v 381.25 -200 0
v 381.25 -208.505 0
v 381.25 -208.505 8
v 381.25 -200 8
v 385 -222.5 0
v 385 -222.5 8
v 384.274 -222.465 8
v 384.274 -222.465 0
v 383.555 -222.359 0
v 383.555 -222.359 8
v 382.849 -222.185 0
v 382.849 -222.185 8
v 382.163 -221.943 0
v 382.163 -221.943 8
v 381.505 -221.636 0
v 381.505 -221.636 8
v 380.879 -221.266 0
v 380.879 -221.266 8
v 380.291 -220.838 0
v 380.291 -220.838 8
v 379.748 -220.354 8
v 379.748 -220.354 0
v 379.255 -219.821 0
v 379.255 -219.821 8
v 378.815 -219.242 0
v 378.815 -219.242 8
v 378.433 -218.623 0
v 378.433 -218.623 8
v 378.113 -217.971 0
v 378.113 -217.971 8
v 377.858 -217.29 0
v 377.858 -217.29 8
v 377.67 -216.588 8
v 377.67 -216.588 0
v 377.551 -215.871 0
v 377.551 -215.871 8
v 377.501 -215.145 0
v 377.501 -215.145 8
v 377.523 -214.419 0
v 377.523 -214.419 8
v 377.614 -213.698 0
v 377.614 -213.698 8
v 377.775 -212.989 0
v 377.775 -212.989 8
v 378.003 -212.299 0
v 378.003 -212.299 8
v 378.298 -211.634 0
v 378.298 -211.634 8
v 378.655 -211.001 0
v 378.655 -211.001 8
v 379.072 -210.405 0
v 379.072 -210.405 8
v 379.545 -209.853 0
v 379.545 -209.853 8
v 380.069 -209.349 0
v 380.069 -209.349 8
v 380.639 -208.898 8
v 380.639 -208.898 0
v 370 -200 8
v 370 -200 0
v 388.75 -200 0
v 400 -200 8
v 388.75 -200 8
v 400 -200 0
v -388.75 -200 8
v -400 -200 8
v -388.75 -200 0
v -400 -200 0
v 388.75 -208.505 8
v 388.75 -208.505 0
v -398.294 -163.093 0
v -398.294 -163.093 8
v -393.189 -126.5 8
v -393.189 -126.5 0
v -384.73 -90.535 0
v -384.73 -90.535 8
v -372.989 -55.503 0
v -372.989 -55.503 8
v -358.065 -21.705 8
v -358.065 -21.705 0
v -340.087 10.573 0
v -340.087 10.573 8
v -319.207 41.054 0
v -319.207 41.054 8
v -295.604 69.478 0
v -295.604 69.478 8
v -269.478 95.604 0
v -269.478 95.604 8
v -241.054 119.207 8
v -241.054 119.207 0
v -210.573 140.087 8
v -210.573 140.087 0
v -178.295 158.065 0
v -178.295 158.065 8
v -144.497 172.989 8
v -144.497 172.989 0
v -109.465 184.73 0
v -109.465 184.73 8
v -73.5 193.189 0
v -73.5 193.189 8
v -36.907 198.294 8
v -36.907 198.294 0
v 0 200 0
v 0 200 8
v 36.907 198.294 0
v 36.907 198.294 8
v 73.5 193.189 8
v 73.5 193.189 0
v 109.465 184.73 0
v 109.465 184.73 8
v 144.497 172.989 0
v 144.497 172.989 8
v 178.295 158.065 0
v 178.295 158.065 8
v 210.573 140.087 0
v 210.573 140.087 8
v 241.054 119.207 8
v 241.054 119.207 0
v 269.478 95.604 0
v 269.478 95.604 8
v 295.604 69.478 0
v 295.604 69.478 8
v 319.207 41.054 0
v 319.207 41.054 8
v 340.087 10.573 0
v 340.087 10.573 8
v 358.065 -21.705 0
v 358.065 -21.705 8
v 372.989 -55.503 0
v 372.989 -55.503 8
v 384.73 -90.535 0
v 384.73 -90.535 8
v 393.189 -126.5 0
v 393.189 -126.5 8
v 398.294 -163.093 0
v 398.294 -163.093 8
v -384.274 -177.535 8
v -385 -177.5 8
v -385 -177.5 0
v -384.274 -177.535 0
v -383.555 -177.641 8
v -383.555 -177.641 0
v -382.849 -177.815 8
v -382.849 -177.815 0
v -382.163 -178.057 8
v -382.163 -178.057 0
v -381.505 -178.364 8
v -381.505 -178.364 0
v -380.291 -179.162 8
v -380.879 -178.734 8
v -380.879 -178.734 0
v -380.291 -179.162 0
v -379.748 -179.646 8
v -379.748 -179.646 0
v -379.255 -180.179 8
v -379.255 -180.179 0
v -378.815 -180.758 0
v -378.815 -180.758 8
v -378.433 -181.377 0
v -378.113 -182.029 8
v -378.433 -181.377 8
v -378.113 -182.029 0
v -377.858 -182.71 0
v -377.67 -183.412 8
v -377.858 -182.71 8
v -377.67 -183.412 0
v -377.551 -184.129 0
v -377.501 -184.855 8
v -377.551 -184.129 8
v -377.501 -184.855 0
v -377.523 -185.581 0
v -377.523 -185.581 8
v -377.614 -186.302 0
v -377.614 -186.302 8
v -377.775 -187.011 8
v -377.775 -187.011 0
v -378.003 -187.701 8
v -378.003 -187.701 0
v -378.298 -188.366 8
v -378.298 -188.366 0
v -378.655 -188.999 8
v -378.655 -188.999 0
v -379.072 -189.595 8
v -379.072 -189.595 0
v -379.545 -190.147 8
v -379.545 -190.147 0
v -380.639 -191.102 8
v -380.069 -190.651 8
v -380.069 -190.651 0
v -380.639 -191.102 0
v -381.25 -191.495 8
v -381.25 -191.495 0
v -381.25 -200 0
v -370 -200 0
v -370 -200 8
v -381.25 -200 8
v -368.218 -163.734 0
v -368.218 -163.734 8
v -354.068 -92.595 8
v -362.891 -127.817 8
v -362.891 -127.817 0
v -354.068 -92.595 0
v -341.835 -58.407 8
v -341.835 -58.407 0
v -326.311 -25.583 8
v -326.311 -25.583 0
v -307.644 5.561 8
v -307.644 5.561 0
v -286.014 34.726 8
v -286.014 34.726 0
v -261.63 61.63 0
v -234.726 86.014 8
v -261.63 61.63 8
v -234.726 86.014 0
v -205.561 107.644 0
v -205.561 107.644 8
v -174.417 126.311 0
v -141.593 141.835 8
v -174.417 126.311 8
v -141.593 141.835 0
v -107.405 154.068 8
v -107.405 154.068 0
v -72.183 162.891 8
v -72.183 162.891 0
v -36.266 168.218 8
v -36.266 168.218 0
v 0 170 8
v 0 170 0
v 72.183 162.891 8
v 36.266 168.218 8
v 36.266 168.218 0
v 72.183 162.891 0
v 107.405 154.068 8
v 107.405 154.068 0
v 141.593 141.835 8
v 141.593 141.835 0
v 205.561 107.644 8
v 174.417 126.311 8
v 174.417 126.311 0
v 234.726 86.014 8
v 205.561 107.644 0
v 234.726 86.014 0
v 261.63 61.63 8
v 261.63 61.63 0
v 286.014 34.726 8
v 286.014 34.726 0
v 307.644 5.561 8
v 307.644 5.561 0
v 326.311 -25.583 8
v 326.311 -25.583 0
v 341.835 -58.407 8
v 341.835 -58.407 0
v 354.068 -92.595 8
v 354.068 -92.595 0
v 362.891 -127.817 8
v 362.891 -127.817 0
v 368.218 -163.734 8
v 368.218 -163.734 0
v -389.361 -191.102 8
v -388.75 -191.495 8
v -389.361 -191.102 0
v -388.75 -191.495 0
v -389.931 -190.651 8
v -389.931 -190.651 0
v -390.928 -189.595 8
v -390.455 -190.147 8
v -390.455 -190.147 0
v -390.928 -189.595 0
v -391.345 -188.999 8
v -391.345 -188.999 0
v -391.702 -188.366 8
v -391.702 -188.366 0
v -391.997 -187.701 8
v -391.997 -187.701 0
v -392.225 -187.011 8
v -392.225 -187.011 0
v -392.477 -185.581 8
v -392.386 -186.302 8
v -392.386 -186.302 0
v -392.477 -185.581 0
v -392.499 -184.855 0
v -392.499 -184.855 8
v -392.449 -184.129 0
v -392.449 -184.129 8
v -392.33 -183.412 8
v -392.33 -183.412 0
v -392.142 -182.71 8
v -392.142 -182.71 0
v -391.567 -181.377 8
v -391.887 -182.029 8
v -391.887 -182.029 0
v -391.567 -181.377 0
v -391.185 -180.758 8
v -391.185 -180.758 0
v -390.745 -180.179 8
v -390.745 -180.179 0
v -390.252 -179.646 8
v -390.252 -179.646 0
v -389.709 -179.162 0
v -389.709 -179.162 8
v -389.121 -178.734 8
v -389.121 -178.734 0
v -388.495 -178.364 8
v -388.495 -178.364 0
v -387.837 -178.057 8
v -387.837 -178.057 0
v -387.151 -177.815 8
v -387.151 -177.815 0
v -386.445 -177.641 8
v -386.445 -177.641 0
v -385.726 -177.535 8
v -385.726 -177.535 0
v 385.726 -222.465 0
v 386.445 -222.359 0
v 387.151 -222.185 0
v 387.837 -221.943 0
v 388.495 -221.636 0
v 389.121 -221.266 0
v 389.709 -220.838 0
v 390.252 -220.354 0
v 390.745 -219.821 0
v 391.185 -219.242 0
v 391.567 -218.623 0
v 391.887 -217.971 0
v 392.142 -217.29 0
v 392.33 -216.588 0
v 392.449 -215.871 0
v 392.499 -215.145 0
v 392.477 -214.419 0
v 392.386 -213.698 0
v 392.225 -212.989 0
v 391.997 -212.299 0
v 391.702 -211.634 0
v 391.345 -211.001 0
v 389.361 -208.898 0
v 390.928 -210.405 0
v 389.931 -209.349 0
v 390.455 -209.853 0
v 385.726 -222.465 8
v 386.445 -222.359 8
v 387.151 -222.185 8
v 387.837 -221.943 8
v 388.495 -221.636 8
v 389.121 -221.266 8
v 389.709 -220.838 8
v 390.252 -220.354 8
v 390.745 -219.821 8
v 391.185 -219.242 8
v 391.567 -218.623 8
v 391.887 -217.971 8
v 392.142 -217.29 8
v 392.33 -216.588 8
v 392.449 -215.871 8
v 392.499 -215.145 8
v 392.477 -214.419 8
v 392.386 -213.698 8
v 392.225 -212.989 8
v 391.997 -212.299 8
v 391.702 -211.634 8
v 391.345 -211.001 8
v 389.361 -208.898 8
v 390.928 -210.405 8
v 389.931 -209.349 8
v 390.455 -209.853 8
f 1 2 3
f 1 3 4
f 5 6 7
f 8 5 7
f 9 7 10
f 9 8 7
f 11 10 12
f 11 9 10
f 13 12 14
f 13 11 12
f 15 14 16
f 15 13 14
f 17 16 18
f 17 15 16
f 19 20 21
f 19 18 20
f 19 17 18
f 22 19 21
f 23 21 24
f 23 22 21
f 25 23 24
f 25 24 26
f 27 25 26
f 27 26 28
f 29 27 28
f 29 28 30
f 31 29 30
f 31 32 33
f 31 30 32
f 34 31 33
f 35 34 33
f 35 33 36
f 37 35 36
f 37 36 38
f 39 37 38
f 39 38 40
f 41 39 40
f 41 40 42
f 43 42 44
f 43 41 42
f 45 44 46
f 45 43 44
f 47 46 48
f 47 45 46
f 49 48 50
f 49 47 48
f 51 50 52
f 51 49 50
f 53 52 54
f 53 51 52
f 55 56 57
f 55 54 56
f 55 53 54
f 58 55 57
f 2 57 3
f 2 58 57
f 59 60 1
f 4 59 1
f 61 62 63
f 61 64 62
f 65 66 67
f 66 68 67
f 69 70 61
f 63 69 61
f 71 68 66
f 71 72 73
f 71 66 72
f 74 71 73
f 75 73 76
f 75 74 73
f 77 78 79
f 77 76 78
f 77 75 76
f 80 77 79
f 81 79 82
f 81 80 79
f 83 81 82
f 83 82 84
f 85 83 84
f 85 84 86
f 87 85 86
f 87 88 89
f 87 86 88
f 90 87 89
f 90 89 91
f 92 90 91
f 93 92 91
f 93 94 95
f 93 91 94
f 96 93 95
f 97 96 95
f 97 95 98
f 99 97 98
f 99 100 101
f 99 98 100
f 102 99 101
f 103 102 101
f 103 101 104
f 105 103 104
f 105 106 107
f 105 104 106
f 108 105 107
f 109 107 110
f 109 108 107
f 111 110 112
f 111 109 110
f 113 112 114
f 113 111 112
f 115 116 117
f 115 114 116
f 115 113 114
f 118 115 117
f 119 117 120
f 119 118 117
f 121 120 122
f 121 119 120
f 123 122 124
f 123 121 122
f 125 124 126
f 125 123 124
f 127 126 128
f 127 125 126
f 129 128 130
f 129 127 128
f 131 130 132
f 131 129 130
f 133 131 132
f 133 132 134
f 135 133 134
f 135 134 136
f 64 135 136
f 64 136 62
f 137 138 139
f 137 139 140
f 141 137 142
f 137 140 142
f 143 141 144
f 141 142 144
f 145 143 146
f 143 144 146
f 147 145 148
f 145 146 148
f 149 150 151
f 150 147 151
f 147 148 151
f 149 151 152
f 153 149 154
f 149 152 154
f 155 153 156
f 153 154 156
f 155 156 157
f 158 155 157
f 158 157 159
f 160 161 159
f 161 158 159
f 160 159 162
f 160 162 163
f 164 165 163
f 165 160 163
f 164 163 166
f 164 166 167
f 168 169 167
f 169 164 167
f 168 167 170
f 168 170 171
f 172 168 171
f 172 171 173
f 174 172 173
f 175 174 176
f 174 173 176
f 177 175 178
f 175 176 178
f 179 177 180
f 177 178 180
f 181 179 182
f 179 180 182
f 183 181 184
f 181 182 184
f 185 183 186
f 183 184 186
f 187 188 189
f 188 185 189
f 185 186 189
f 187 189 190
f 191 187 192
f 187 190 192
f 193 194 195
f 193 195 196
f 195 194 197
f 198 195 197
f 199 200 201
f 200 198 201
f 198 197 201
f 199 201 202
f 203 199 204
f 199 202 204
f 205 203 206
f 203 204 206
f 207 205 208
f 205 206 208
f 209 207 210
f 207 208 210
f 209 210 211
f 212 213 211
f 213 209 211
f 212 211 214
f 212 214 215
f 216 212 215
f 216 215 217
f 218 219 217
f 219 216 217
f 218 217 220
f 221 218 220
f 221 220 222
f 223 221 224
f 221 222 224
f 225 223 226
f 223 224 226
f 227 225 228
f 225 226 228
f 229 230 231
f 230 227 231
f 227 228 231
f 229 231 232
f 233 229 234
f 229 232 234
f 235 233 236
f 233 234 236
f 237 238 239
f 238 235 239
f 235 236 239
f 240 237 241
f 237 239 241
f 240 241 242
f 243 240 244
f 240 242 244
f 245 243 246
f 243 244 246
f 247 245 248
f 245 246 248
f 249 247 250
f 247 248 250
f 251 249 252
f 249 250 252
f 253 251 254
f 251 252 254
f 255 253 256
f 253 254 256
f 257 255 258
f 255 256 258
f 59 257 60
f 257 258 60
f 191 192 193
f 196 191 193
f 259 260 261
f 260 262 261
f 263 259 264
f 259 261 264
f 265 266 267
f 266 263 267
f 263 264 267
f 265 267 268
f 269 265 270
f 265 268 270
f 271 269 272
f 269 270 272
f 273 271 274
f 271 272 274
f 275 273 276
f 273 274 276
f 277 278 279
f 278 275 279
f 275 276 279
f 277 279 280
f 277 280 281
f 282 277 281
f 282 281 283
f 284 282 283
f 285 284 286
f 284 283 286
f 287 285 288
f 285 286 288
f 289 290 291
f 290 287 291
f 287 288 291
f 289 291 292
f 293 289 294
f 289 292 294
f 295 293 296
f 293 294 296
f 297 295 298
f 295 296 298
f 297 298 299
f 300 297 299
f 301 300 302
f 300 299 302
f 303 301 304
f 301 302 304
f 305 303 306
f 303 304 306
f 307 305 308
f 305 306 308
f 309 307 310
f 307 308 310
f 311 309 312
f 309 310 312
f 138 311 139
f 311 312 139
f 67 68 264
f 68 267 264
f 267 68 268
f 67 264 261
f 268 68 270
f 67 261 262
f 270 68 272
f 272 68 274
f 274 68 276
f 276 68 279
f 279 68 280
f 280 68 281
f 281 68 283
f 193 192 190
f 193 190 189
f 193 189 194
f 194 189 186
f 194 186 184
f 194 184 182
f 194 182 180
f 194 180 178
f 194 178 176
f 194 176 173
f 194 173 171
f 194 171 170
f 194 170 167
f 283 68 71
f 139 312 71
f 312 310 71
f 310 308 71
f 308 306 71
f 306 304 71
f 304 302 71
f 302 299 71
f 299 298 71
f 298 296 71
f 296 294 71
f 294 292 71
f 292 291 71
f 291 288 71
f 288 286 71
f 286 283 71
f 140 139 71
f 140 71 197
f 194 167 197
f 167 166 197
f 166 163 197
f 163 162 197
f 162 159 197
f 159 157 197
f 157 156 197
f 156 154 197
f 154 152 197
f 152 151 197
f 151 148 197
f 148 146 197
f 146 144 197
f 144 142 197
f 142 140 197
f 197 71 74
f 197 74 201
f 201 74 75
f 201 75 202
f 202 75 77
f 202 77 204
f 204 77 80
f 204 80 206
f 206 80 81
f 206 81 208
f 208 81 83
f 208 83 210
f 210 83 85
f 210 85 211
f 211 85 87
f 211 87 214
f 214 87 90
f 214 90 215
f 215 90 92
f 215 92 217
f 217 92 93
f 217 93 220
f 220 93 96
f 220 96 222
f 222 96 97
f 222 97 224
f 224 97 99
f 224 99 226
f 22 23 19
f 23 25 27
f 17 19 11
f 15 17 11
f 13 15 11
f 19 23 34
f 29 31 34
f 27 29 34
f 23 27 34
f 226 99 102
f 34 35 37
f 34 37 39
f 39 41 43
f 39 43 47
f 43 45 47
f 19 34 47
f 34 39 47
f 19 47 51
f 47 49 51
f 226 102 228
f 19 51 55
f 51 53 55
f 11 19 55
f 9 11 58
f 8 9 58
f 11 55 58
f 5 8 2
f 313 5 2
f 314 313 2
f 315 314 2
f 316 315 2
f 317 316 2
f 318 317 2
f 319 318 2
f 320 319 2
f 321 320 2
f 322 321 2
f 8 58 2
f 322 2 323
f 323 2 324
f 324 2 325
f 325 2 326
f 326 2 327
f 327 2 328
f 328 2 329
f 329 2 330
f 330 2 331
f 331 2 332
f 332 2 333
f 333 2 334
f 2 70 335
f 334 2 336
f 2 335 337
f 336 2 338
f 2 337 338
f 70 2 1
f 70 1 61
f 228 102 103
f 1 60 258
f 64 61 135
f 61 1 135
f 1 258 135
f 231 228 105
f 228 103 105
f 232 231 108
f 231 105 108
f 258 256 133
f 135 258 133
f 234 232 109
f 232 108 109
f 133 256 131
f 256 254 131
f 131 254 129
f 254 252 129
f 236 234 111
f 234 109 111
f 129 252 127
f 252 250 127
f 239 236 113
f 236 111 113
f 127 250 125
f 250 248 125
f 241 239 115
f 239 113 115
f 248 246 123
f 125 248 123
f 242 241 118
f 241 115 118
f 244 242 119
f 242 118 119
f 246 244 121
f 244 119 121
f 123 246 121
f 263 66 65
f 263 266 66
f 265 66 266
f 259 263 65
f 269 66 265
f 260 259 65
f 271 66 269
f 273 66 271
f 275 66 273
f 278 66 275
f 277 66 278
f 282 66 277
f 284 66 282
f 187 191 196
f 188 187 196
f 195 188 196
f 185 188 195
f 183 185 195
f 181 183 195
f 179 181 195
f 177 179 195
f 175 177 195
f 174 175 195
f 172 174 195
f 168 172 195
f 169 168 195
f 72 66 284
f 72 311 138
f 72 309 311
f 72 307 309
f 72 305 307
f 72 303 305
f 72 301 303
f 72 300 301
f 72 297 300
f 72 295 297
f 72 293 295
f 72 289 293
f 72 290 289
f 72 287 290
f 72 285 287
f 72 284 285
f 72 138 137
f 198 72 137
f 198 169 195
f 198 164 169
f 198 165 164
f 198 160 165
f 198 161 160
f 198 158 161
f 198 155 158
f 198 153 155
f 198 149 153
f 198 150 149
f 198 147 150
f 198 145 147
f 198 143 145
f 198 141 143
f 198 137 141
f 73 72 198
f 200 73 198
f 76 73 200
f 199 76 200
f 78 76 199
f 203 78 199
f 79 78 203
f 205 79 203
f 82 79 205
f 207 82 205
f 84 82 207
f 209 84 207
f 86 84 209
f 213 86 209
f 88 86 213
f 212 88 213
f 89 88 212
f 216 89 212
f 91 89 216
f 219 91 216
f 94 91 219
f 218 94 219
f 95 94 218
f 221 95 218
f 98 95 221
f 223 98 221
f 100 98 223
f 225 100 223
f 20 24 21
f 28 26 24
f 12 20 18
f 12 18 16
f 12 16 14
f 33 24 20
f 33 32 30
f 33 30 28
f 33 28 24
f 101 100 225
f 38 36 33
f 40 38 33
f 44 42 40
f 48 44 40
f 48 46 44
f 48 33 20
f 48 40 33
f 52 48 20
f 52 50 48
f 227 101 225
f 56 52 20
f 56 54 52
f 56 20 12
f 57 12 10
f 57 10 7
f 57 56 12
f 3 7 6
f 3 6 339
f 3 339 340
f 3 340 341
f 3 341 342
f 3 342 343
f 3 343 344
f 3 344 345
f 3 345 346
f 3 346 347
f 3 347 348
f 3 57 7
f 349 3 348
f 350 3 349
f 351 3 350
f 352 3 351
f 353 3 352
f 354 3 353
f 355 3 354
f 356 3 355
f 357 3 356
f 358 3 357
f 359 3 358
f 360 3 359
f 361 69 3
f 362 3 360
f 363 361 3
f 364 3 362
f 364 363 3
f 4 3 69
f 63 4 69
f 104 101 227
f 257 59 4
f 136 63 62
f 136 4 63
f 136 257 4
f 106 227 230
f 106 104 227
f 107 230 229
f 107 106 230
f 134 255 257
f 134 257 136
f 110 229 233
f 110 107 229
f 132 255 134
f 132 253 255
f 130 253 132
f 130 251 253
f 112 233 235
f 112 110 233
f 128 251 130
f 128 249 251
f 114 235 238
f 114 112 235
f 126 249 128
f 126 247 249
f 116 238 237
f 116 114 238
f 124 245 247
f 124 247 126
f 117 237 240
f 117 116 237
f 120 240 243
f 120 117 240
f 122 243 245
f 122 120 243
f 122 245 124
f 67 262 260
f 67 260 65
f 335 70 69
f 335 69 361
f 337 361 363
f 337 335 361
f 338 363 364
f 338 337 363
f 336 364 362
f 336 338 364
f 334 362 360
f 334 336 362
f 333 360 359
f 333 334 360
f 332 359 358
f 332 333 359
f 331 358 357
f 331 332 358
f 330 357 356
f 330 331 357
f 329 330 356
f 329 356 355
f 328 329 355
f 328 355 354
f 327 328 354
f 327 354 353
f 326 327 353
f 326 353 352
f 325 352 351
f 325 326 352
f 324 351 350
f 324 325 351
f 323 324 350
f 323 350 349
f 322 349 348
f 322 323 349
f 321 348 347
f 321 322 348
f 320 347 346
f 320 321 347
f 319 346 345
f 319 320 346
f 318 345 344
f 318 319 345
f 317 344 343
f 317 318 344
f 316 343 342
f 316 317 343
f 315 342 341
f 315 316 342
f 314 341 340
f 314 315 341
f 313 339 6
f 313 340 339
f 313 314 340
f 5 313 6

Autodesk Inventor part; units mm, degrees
ref_plane "YZ Plane" through (0, 0, 0) normal (1, 0, 0) x (0, 1, 0)
ref_plane "XZ Plane" through (0, 0, 0) normal (0, 1, 0) x (-1, 0, 0)
ref_plane "XY Plane" through (0, 0, 0) normal (0, 0, 1) x (1, 0, 0)
ref_plane "Work Plane1" through (0, 0, 0) normal (0, 0, 1) x (1, 0, 0)
sketch "Sketch1" plane through (0, 0, 0) normal (0, 0, 1) x (1, 0, 0)
  line L0 (250, -200) -> (400, -200) construction
  arc A0 (400, -200) -> (-400, -200) centre (0, -200) ccw construction
  line L1 (-400, -200) -> (-250, -200) construction
  arc A1 (250, -200) -> (-250, -200) centre (0, -200) ccw construction
  arc A2 (400, -200) -> (-400, -200) centre (0, -200) ccw
  arc A3 (370, -200) -> (-370, -200) centre (0, -200) ccw
  line L2 (400, -200) -> (370, -200) construction
  line L3 (385, -200) -> (385, -231.622) construction
  arc A4 (385, -222.5) -> (388.75, -208.5048) centre (385, -215) ccw
  line L4 (388.75, -208.5048) -> (388.75, -200)
  line L5 (400, -200) -> (388.75, -200)
  arc A5 (381.25, -208.5048) -> (385, -222.5) centre (385, -215) ccw
  line L6 (381.25, -208.5048) -> (381.25, -200)
  line L7 (370, -200) -> (381.25, -200)
  line L8 (-381.25, -191.4952) -> (-381.25, -200)
  arc A6 (-381.25, -191.4952) -> (-385, -177.5) centre (-385, -185) ccw
  line L9 (-370, -200) -> (-381.25, -200)
  arc A7 (-385, -177.5) -> (-388.75, -191.4952) centre (-385, -185) ccw
  line L10 (-388.75, -191.4952) -> (-388.75, -200)
  line L11 (-400, -200) -> (-388.75, -200)
  point P0 (0, 0)
  point P1 (-400, -200)
  point P2 (-370, -200)
  dimension "d0" = 30
  dimension "d1" = 7.5
  dimension "d2" = 7.5
  dimension "d3" = 15
  dimension "d6" = 180
extrude "Extrusion1" add sketch "Sketch1" along normal blind 8
properties part number "barrier"
